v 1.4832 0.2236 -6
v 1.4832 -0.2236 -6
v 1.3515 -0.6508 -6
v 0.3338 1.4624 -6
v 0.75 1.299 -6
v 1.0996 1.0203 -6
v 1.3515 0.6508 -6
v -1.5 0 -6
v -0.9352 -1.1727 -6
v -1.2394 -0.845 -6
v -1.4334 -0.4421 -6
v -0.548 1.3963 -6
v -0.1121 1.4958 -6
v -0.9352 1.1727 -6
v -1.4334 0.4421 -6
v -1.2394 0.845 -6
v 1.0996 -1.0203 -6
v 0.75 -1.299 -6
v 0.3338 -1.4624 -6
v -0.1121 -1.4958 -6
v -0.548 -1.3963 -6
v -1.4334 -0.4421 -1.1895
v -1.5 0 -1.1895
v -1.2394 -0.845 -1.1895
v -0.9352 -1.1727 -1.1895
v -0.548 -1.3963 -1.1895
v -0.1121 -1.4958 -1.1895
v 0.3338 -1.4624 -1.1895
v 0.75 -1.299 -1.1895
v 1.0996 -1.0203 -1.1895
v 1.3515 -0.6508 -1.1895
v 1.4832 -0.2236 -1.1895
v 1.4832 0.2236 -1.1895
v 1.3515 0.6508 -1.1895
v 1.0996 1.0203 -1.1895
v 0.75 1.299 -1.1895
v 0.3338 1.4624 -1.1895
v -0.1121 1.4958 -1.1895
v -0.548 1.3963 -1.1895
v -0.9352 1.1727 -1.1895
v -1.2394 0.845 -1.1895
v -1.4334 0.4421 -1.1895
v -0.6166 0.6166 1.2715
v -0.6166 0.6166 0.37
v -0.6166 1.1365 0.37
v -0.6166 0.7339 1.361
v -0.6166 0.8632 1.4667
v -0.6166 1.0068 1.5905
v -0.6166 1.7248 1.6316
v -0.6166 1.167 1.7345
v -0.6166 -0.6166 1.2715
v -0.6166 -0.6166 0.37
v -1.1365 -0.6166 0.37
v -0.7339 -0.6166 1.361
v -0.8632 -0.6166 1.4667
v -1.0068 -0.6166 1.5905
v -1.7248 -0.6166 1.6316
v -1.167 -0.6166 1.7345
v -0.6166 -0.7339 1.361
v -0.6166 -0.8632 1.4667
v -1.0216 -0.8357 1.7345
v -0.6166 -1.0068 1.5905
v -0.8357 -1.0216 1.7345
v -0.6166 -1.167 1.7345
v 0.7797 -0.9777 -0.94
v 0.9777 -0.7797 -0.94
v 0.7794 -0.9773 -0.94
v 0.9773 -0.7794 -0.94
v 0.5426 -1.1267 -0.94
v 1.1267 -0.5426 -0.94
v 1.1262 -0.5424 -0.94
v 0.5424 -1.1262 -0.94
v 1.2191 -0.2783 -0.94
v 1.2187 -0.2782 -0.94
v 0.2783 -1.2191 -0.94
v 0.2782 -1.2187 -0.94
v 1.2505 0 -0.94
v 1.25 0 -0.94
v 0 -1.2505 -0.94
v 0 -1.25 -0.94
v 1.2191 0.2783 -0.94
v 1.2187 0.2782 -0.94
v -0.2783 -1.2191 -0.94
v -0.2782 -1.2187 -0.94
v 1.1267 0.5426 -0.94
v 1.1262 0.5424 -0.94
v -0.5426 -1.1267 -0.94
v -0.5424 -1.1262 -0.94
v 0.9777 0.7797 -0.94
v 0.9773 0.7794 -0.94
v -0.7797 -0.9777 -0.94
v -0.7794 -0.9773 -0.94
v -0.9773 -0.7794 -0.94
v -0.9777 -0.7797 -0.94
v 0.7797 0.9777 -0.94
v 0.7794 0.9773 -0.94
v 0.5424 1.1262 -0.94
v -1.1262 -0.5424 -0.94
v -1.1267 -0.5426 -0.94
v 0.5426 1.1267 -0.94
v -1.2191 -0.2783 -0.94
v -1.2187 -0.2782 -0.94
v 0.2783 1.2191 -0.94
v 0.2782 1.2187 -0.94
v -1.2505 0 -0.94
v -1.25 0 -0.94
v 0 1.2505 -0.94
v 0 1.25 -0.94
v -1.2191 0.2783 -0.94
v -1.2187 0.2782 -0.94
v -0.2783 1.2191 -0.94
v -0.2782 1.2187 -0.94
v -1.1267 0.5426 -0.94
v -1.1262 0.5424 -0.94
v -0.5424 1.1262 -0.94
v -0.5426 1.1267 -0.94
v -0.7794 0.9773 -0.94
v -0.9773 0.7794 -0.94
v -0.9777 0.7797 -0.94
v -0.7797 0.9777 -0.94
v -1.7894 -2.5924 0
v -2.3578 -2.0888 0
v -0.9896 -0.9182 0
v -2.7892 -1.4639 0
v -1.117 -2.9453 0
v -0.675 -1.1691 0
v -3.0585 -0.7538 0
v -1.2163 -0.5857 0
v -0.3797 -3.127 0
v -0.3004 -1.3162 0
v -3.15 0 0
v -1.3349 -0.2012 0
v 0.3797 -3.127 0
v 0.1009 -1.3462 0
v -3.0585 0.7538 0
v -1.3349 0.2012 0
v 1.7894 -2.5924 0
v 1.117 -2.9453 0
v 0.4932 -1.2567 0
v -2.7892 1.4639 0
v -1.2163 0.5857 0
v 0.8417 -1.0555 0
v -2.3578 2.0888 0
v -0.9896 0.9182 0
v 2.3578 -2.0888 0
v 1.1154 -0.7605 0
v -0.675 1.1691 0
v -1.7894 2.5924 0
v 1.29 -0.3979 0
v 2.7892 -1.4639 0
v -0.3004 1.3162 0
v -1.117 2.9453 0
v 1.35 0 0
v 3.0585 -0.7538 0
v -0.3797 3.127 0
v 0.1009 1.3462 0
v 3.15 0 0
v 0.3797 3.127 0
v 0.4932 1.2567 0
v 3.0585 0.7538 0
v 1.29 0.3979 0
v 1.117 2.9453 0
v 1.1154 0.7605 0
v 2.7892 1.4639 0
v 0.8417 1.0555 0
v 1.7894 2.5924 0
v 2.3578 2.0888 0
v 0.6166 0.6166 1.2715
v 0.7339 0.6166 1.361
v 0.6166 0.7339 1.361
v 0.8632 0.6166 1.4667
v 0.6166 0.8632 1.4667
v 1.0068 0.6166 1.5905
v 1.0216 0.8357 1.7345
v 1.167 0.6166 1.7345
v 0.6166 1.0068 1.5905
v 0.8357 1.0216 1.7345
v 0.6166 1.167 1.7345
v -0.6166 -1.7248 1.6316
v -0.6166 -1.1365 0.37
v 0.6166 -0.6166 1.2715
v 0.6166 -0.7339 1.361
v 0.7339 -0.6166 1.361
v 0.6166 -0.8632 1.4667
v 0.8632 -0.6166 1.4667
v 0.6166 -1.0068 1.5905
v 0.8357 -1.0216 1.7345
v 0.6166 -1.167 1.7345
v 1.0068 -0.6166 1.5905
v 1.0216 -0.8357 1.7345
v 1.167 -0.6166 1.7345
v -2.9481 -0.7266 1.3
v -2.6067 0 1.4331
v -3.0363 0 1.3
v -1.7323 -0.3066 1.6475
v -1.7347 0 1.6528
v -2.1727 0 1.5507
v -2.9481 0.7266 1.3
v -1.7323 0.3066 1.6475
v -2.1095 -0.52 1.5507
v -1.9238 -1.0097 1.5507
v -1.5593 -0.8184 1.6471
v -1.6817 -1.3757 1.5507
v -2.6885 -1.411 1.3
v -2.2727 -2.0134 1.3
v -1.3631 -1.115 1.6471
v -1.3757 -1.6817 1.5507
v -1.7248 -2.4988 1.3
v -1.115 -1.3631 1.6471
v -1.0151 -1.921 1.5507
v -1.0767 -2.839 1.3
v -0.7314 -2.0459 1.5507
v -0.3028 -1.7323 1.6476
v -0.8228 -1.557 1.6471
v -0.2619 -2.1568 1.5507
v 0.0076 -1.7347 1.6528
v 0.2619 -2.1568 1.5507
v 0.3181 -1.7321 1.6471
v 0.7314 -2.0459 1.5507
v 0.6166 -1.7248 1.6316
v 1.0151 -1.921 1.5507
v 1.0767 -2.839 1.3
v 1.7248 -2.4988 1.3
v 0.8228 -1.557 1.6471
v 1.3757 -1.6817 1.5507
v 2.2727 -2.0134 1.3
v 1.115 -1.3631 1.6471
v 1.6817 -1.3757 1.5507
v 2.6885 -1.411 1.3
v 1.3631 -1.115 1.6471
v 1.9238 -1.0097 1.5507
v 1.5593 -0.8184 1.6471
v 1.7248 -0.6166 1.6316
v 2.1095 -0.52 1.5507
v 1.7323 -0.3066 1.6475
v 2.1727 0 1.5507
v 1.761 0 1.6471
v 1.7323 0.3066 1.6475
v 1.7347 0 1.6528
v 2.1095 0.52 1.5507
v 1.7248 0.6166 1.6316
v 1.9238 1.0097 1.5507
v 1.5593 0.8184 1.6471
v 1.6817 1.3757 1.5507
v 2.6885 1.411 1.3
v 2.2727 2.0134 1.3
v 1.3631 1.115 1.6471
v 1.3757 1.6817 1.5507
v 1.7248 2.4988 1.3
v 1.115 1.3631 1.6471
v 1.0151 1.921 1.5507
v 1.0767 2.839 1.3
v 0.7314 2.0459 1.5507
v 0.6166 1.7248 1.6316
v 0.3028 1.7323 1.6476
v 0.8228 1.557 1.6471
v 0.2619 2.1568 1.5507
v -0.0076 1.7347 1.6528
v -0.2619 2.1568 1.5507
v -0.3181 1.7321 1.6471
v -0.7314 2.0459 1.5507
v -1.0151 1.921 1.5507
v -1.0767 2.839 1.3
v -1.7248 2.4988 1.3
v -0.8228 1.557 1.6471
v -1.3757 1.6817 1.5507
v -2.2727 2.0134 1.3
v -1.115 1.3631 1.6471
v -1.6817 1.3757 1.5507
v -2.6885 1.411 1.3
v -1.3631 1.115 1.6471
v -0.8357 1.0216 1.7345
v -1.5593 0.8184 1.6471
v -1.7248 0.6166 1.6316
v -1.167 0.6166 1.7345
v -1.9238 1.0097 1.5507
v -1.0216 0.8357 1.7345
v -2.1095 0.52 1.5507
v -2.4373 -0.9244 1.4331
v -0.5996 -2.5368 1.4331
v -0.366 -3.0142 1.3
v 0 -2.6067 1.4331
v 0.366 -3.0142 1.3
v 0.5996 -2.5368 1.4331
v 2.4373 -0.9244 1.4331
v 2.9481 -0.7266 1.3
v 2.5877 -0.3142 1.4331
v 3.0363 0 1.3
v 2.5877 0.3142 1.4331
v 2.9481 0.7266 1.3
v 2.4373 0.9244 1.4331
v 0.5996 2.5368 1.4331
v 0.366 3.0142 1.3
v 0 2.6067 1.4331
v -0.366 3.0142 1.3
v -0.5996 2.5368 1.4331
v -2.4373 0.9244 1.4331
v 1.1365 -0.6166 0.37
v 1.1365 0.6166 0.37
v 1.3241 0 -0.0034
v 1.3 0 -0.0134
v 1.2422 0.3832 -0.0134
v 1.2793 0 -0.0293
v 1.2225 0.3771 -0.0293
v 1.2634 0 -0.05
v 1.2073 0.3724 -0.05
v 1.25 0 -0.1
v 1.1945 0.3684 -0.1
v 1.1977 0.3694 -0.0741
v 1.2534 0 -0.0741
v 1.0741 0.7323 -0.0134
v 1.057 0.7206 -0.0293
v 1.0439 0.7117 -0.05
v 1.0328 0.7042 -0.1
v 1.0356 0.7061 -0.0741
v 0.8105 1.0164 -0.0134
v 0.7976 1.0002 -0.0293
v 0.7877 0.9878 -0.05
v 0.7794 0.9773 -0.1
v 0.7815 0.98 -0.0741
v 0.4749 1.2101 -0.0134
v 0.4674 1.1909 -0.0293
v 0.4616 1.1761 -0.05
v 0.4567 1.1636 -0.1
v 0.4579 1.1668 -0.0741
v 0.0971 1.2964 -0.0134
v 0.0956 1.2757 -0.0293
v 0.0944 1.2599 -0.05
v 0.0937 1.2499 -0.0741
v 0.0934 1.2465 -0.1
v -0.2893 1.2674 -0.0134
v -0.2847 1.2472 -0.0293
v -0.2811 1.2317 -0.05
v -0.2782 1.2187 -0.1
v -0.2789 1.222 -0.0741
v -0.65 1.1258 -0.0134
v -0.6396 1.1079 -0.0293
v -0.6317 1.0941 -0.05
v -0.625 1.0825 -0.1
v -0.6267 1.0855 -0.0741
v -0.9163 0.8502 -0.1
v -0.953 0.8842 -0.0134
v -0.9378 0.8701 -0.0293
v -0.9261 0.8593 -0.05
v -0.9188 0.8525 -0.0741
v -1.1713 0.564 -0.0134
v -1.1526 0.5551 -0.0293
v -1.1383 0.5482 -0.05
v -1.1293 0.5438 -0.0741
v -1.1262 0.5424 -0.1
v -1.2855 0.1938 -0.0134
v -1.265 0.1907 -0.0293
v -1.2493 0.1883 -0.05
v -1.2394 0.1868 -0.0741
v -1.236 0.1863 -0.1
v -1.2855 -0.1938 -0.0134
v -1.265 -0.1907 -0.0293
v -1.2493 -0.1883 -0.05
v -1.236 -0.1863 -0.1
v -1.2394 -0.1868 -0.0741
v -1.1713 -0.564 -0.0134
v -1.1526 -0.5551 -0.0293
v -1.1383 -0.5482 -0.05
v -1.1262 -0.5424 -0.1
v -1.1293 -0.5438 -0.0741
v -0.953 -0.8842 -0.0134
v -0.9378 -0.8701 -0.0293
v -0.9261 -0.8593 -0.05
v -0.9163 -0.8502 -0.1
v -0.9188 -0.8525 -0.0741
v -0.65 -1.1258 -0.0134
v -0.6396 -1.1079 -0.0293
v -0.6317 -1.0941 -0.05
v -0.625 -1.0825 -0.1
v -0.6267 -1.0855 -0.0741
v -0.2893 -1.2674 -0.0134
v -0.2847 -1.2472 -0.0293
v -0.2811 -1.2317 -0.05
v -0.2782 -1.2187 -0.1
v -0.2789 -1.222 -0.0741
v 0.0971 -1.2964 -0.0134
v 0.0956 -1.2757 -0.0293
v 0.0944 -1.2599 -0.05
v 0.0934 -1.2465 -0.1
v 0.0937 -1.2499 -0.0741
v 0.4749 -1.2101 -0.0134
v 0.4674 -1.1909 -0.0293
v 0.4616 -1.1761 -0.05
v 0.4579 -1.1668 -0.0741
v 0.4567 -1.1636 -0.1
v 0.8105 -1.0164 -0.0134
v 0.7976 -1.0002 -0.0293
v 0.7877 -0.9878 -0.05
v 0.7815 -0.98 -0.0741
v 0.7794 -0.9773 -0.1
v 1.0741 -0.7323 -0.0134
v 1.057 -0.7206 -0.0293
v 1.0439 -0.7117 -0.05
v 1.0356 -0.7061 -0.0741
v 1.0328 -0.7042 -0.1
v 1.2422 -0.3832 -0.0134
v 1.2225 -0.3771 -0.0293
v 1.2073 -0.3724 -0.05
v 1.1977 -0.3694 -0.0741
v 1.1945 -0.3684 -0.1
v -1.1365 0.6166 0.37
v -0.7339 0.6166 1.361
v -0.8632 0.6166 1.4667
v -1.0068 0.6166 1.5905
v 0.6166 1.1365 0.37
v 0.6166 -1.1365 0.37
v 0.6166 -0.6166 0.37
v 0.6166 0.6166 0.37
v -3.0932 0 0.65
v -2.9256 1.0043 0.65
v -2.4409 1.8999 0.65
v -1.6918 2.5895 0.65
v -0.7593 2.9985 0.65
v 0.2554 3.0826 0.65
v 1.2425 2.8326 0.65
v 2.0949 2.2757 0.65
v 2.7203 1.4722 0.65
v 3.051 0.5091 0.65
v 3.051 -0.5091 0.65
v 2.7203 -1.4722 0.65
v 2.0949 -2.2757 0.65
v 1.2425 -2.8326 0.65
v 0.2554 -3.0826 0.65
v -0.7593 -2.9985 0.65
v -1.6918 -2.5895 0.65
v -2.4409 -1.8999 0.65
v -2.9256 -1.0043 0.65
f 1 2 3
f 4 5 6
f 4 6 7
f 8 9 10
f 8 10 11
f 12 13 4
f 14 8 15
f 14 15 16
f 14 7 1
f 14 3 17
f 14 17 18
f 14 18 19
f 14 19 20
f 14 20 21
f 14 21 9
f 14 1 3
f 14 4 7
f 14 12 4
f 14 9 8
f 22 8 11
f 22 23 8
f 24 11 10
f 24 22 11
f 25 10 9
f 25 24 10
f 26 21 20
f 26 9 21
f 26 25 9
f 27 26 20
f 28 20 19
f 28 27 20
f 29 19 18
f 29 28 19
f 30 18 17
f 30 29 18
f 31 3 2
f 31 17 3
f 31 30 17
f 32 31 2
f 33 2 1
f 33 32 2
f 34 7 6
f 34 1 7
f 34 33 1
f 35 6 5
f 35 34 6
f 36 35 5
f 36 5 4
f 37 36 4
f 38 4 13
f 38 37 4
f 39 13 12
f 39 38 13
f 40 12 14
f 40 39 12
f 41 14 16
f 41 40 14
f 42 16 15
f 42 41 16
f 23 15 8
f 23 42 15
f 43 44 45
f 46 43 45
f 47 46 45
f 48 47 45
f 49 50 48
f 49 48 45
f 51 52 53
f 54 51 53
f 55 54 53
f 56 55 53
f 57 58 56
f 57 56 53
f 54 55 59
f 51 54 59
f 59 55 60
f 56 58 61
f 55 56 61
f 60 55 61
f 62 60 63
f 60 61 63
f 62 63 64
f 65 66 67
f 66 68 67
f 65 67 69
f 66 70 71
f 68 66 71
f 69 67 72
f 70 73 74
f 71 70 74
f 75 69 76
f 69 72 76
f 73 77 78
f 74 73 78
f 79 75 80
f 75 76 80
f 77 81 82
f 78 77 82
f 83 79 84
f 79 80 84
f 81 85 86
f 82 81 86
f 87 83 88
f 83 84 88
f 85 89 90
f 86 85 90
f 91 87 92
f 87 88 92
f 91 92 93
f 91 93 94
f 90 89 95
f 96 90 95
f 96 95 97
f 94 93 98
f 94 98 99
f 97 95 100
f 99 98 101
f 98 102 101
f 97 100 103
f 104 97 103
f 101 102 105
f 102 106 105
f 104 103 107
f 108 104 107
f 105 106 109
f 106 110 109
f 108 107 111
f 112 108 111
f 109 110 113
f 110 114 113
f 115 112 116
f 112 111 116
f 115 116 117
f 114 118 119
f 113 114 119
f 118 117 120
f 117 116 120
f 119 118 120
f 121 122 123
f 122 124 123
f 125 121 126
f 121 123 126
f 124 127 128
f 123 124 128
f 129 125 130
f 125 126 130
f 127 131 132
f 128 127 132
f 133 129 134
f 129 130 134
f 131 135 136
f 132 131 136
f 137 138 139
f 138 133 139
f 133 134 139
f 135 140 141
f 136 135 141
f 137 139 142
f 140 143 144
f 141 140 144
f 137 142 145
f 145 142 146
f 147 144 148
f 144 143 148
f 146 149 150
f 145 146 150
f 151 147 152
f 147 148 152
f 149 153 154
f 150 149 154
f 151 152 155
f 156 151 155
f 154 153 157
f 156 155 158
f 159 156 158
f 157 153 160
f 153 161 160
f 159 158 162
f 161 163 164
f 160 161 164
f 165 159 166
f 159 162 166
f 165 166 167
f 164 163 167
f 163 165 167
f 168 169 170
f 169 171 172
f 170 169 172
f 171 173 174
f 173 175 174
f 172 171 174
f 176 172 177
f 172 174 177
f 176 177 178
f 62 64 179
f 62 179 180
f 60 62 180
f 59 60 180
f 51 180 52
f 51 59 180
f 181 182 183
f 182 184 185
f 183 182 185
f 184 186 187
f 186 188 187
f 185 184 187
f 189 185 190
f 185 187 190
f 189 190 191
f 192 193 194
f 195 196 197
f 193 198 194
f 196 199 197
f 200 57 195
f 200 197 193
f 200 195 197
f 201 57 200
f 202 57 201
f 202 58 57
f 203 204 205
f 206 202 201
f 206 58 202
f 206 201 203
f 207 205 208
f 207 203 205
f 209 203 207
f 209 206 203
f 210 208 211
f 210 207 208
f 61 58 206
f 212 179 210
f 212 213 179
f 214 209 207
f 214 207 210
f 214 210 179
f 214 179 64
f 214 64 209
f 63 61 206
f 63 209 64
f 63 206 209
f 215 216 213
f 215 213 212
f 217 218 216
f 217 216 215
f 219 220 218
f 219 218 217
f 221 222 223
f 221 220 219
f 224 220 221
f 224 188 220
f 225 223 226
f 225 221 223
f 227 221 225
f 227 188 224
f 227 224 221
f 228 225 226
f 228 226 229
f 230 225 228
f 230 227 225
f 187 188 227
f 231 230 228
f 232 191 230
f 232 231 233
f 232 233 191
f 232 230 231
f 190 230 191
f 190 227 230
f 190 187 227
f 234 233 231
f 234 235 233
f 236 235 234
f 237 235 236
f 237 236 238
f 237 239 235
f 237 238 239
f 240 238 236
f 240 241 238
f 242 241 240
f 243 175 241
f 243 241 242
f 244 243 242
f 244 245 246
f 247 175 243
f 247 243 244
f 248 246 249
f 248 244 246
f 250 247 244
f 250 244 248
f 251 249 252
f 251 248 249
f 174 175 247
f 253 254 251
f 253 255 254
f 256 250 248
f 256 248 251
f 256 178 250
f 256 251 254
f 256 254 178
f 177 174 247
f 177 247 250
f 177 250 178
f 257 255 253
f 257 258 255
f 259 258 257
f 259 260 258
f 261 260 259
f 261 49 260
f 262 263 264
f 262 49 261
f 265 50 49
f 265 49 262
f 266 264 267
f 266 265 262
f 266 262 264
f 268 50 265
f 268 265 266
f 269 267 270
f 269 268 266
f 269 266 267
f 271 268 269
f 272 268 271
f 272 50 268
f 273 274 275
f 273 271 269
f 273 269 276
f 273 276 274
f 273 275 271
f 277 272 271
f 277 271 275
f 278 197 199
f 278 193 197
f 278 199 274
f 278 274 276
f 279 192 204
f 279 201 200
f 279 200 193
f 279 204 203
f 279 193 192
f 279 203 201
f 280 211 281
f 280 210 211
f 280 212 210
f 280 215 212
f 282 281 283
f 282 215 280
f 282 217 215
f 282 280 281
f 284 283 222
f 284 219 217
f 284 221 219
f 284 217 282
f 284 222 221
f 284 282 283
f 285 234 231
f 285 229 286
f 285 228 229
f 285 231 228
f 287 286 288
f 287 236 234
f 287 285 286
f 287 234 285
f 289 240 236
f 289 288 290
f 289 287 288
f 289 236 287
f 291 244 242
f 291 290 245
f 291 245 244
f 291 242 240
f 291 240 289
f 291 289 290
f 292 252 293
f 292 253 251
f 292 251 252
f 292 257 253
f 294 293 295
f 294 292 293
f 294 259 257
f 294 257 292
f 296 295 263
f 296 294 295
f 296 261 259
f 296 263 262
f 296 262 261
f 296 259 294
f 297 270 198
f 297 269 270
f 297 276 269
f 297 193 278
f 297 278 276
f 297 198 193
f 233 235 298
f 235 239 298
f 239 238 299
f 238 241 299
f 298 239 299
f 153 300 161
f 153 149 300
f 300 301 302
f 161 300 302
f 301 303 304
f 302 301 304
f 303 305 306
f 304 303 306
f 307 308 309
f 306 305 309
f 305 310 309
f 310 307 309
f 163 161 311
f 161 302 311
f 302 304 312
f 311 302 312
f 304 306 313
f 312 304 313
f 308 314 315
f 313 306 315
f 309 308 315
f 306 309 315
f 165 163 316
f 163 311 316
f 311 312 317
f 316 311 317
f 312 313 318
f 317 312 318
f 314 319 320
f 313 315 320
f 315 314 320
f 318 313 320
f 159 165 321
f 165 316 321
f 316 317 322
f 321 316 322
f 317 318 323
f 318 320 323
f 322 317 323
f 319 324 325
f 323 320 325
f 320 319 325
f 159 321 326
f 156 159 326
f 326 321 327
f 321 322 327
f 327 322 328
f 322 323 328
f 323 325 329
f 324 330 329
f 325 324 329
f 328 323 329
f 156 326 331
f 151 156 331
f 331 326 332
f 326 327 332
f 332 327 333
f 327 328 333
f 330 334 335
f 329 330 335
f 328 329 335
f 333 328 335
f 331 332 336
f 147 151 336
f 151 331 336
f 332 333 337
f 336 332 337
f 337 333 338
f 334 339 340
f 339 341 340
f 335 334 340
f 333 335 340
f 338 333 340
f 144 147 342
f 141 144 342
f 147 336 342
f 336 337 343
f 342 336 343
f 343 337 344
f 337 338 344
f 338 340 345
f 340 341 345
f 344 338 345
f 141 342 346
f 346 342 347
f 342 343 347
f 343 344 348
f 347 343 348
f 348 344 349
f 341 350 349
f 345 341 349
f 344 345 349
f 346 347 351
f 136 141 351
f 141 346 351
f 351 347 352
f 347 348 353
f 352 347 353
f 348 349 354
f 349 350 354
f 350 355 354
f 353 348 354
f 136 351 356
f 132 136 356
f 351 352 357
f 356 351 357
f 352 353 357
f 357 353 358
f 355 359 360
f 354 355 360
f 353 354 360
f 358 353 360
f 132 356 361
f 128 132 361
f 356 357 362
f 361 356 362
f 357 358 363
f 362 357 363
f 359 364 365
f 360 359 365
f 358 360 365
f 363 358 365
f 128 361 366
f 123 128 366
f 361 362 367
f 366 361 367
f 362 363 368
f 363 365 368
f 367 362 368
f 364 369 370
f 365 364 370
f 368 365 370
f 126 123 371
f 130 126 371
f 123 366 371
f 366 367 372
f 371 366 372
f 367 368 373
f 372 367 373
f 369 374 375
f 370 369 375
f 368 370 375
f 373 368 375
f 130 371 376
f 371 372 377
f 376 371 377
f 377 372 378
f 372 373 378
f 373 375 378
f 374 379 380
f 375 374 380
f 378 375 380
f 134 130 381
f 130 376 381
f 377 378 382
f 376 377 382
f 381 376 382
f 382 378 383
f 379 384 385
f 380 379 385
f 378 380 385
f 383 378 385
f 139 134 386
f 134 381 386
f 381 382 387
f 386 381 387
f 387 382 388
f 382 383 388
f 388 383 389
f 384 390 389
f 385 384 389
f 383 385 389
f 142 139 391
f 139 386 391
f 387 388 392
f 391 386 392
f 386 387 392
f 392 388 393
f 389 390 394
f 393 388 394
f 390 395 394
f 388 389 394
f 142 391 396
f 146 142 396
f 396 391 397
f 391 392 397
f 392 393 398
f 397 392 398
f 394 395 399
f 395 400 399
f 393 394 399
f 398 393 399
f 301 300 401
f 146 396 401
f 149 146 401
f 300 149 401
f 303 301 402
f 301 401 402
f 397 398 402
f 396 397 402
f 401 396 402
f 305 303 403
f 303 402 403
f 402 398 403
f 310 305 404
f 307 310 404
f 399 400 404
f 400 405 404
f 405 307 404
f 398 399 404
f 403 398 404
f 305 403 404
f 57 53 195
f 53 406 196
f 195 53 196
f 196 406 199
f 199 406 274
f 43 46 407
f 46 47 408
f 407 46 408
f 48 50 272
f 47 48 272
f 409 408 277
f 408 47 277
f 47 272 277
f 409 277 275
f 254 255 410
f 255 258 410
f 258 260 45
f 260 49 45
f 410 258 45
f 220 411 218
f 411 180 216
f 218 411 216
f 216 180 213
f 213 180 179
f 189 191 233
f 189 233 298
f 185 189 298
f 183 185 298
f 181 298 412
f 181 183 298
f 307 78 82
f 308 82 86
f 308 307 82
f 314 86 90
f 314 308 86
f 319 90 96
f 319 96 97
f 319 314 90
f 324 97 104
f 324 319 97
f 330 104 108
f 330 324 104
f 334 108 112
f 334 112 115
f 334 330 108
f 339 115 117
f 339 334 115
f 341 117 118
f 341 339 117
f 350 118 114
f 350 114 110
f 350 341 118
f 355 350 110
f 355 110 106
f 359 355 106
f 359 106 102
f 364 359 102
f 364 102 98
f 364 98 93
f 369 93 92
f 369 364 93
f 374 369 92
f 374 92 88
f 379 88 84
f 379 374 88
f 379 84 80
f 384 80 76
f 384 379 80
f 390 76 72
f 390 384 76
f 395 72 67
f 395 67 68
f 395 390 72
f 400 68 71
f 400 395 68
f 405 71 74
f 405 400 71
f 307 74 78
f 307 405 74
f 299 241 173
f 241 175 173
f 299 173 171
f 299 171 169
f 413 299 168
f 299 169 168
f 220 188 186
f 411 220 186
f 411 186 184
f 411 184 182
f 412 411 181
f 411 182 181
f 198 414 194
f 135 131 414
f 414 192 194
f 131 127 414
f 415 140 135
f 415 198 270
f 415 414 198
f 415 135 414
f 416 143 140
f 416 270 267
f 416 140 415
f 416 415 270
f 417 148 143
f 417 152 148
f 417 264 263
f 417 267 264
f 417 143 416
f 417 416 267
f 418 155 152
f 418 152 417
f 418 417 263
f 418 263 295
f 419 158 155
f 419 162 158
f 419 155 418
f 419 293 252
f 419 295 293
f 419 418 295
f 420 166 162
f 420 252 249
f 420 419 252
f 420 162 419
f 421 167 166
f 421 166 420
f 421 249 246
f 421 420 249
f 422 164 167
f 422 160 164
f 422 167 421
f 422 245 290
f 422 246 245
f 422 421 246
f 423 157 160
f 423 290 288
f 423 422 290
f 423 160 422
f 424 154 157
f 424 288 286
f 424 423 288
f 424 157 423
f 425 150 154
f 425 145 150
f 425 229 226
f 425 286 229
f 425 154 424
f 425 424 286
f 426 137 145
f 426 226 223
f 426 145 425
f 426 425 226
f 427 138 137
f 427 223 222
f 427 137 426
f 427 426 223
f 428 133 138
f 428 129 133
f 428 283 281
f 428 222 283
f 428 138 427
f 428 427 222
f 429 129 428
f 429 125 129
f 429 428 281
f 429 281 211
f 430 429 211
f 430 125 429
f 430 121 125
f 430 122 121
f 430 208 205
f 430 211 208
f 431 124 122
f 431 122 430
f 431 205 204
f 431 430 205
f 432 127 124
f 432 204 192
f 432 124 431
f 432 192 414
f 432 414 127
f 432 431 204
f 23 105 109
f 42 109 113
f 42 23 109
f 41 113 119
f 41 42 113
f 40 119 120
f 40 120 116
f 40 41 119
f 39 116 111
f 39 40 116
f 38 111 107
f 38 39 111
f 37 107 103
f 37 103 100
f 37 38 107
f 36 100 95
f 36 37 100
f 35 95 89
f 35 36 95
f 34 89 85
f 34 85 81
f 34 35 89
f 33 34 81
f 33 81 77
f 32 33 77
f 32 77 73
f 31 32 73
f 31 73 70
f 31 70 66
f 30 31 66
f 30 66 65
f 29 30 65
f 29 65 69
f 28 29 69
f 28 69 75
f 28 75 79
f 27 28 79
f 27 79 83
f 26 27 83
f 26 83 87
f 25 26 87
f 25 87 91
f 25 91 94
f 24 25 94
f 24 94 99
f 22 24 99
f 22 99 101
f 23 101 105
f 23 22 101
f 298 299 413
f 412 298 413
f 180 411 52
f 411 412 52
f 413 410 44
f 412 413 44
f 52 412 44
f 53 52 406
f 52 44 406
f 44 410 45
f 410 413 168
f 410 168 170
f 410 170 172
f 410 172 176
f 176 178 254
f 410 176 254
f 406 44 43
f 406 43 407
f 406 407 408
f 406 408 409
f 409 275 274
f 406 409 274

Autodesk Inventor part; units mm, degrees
ref_plane "YZ Plane" through (0, 0, 0) normal (1, 0, 0) x (0, 1, 0)
sketch "Эскиз2" plane through (0, 0, 0) normal (0, 0, 1) x (1, 0, 0)
  circle A0 centre (0, 0) radius 1.25
  dimension "d3" = 2.5
extrude "Выдавливание1" add sketch "Эскиз2" against normal blind 0.94
sketch "Эскиз3" plane through (0, 0, -0.94) normal (0, 0, -1) x (-1, 0, 0)
  circle A0 centre (0, 0) radius 1.5
  circle A1 centre (0, 0) radius 1.25 construction
  dimension "d28" = 360
  dimension "d9" = 3
extrude "Выдавливание2" add sketch "Эскиз3" along normal blind 5.06
chamfer "Фаска1" distance 0.25 distance2 0.25 1 edges at (1.5, 0, -0.94) measured on face at (-1.39, -0.2194, -0.94)
sketch "Эскиз4" plane through (0, 0, 0) normal (0, 0, 1) x (1, 0, 0)
  circle A0 centre (0, 0) radius 3.15
  circle A1 centre (0, 0) radius 1.25 construction
  dimension "d15" = 6.3
extrude "Выдавливание3" add sketch "Эскиз4" along normal blind 1.3
fillet "Сопряжение1" radius 0.1 1 edges at (-1.25, 0, 0)
sketch "Эскиз5" plane through (0, 0, 0) normal (0, 1, 0) x (-1, 0, 0)
  line L0 (3.15, 1.3) -> (3.15, 0)
  line L1 (3.0363, 1.3) -> (3.15, 1.3)
  line L2 (3.15, 0) -> (3.0363, 1.3)
  line L3 (-3.15, 1.3) -> (3.15, 1.3) construction
  line L4 (-3.15, 0) -> (3.15, 0) construction
  line L5 (0, -0.26) -> (0, 1.56) projected
  line L6 (4.41, 0) -> (-4.41, 0) projected
  dimension "d20" = 5
  dimension "d56" = 3.15
  dimension "d57" = 1.3
revolve "Вращение1" cut sketch "Эскиз5" angle 360 about axis through (0, 0, -10) along (0, 0, 1)
sketch "Эскиз6" plane through (0, 0, 0) normal (0, 1, 0) x (-1, 0, 0)
  line L0 (0, 1.9) -> (0, 1.3)
  arc A0 (3.0363, 1.3) -> (0, 1.9) centre (-0.906, -10.6674) ccw
  line L1 (0, 1.3) -> (3.0363, 1.3)
  line L2 (3.0363, 1.3) -> (-3.0363, 1.3) construction
  line L3 (0, -4.4495) -> (0, 0.4495)
  line L4 (0, -13.1996) -> (0, 4.5258) projected
  line L5 (4.273, 0) -> (-4.2545, 0) projected
  dimension "d58" = 0.6
  dimension "d59" = 3.0363
  dimension "d60" = 0
  dimension "d62" = 12.6
revolve "Вращение2" add sketch "Эскиз6" angle 360 about axis through (0, 0, -4.4495) along (0, 0, 1)
sketch "Эскиз7" plane through (0, 0, 0) normal (0, 1, 0) x (-1, 0, 0)
  line L0 (1.85, 1.9) -> (-1.85, 1.9)
  line L1 (1.1365, 0.37) -> (1.85, 1.9)
  line L2 (-1.1365, 0.37) -> (1.1365, 0.37)
  line L3 (-1.85, 1.9) -> (-1.1365, 0.37)
  line L4 (0, 0.064) -> (0, 2.206) projected
  line L5 (2.59, 0) -> (-2.59, 0) projected
  dimension "d32" = 1.53
  dimension "d34" = 65
  dimension "d36" = 65
  dimension "d63" = 1.85
  dimension "d64" = 1.9
  dimension "d65" = 3.7
extrude "Выдавливание4" cut sketch "Эскиз7" against normal mid plane 1.2333
sketch "Эскиз8" plane through (0, 0, 0) normal (1, 0, 0) x (0, 1, 0)
  line L0 (-1.1365, 0.37) -> (-1.85, 1.9)
  line L1 (1.1365, 0.37) -> (-1.1365, 0.37)
  line L2 (1.85, 1.9) -> (1.1365, 0.37)
  line L3 (-1.85, 1.9) -> (1.85, 1.9)
  line L4 (0, 0.064) -> (0, 2.206) projected
  line L5 (-2.59, 0) -> (2.59, 0) projected
  dimension "d40" = 65
  dimension "d42" = 65
  dimension "d44" = 1.53
  dimension "d66" = 3.7
  dimension "d67" = 1.9
  dimension "d69" = 1.85
extrude "Выдавливание5" cut sketch "Эскиз8" along normal mid plane 1.2333
sketch "Эскиз9" plane through (0, 0, 0) normal (0, 1, 0) x (-1, 0, 0)
  line L0 (0, 1.9) -> (0, 0.37)
  line L1 (1.48, 1.9) -> (0, 1.9)
  line L2 (0, 0.37) -> (1.48, 1.9)
  line L3 (-3.15, 0) -> (3.15, 0) construction
  line L4 (0, -0.38) -> (0, 2.28) projected
  line L5 (4.41, 0) -> (-4.41, 0) projected
  dimension "d50" = 1.53
  dimension "d52" = 1.53
  dimension "d54" = 1.48
  dimension "d70" = 0
  dimension "d71" = 1.9
revolve "Вращение3" cut sketch "Эскиз9" angle 360 about axis through (0, 0, -10) along (0, 0, 1)
thread "Резьба1" size "M3x0.5" class "6g" standard "ISO Metric profile" full length
ref_plane "MSC_PF1" through (0, 0, 0) normal (1, 0, 0) x (0, 1, 0)
ref_plane "MSC_PT1" through (0, 0, 0) normal (0, 0, -1) x (-1, 0, 0)
equation "\"d4\" = -b + NLG"
equation "\"d9\" = NND"
equation "\"d10\" = b"
equation "\"d12\" = -0.5 * msp_ds + 0.5 * NND"
equation "\"d13\" = 0.5 * NND - 0.5 * msp_ds"
equation "\"d15\" = Dk"
equation "\"d16\" = ParK"
equation "\"d18\" = r"
equation "\"d32\" = q"
equation "\"d63\" = 0.5 * M"
equation "\"d64\" = ParK + ParF"
equation "\"d65\" = M"
equation "\"d37\" = 2 * msp_s"
equation "\"d44\" = q"
equation "\"d66\" = M"
equation "\"d67\" = ParK + ParF"
equation "\"d69\" = 0.5 * M"
equation "\"d47\" = 2 * msp_s"
equation "\"d3\" = msp_ds"
equation "\"d56\" = 0.5 * Dk"
equation "\"d57\" = ParK"
equation "\"d58\" = ParF"
equation "\"d59\" = 0.5 * Dk - msp_v"
equation "\"d62\" = 2 * Dk"
equation "\"d50\" = q"
equation "\"d52\" = q"
equation "\"d54\" = msp_rr"
equation "\"d71\" = ParK + ParF"
equation "\"PTC\" = 0.5"
equation "\"NLG\" = 6"
equation "\"Dk\" = 6.3"
equation "\"ParK\" = 1.3"
equation "\"NND\" = 3"
equation "\"M\" = 3.7"
equation "\"q\" = 1.53"
equation "\"r\" = 0.1"
equation "\"msp_ds\" = NND - PTC"
equation "\"b\" = 5.06"
equation "\"msp_x\" = 1.25 * PTC"
equation "\"msp_s\" = 0.166667 * M"
equation "\"msp_rr\" = 0.4 * M"
equation "\"ParF\" = 0.6"
equation "\"msp_v\" = 0.0874887 * ParK"
equation "\"THREADDIA\" = NND"
properties part number "JIS B 1111 - M3x6" material "Сталь, мягкая"
